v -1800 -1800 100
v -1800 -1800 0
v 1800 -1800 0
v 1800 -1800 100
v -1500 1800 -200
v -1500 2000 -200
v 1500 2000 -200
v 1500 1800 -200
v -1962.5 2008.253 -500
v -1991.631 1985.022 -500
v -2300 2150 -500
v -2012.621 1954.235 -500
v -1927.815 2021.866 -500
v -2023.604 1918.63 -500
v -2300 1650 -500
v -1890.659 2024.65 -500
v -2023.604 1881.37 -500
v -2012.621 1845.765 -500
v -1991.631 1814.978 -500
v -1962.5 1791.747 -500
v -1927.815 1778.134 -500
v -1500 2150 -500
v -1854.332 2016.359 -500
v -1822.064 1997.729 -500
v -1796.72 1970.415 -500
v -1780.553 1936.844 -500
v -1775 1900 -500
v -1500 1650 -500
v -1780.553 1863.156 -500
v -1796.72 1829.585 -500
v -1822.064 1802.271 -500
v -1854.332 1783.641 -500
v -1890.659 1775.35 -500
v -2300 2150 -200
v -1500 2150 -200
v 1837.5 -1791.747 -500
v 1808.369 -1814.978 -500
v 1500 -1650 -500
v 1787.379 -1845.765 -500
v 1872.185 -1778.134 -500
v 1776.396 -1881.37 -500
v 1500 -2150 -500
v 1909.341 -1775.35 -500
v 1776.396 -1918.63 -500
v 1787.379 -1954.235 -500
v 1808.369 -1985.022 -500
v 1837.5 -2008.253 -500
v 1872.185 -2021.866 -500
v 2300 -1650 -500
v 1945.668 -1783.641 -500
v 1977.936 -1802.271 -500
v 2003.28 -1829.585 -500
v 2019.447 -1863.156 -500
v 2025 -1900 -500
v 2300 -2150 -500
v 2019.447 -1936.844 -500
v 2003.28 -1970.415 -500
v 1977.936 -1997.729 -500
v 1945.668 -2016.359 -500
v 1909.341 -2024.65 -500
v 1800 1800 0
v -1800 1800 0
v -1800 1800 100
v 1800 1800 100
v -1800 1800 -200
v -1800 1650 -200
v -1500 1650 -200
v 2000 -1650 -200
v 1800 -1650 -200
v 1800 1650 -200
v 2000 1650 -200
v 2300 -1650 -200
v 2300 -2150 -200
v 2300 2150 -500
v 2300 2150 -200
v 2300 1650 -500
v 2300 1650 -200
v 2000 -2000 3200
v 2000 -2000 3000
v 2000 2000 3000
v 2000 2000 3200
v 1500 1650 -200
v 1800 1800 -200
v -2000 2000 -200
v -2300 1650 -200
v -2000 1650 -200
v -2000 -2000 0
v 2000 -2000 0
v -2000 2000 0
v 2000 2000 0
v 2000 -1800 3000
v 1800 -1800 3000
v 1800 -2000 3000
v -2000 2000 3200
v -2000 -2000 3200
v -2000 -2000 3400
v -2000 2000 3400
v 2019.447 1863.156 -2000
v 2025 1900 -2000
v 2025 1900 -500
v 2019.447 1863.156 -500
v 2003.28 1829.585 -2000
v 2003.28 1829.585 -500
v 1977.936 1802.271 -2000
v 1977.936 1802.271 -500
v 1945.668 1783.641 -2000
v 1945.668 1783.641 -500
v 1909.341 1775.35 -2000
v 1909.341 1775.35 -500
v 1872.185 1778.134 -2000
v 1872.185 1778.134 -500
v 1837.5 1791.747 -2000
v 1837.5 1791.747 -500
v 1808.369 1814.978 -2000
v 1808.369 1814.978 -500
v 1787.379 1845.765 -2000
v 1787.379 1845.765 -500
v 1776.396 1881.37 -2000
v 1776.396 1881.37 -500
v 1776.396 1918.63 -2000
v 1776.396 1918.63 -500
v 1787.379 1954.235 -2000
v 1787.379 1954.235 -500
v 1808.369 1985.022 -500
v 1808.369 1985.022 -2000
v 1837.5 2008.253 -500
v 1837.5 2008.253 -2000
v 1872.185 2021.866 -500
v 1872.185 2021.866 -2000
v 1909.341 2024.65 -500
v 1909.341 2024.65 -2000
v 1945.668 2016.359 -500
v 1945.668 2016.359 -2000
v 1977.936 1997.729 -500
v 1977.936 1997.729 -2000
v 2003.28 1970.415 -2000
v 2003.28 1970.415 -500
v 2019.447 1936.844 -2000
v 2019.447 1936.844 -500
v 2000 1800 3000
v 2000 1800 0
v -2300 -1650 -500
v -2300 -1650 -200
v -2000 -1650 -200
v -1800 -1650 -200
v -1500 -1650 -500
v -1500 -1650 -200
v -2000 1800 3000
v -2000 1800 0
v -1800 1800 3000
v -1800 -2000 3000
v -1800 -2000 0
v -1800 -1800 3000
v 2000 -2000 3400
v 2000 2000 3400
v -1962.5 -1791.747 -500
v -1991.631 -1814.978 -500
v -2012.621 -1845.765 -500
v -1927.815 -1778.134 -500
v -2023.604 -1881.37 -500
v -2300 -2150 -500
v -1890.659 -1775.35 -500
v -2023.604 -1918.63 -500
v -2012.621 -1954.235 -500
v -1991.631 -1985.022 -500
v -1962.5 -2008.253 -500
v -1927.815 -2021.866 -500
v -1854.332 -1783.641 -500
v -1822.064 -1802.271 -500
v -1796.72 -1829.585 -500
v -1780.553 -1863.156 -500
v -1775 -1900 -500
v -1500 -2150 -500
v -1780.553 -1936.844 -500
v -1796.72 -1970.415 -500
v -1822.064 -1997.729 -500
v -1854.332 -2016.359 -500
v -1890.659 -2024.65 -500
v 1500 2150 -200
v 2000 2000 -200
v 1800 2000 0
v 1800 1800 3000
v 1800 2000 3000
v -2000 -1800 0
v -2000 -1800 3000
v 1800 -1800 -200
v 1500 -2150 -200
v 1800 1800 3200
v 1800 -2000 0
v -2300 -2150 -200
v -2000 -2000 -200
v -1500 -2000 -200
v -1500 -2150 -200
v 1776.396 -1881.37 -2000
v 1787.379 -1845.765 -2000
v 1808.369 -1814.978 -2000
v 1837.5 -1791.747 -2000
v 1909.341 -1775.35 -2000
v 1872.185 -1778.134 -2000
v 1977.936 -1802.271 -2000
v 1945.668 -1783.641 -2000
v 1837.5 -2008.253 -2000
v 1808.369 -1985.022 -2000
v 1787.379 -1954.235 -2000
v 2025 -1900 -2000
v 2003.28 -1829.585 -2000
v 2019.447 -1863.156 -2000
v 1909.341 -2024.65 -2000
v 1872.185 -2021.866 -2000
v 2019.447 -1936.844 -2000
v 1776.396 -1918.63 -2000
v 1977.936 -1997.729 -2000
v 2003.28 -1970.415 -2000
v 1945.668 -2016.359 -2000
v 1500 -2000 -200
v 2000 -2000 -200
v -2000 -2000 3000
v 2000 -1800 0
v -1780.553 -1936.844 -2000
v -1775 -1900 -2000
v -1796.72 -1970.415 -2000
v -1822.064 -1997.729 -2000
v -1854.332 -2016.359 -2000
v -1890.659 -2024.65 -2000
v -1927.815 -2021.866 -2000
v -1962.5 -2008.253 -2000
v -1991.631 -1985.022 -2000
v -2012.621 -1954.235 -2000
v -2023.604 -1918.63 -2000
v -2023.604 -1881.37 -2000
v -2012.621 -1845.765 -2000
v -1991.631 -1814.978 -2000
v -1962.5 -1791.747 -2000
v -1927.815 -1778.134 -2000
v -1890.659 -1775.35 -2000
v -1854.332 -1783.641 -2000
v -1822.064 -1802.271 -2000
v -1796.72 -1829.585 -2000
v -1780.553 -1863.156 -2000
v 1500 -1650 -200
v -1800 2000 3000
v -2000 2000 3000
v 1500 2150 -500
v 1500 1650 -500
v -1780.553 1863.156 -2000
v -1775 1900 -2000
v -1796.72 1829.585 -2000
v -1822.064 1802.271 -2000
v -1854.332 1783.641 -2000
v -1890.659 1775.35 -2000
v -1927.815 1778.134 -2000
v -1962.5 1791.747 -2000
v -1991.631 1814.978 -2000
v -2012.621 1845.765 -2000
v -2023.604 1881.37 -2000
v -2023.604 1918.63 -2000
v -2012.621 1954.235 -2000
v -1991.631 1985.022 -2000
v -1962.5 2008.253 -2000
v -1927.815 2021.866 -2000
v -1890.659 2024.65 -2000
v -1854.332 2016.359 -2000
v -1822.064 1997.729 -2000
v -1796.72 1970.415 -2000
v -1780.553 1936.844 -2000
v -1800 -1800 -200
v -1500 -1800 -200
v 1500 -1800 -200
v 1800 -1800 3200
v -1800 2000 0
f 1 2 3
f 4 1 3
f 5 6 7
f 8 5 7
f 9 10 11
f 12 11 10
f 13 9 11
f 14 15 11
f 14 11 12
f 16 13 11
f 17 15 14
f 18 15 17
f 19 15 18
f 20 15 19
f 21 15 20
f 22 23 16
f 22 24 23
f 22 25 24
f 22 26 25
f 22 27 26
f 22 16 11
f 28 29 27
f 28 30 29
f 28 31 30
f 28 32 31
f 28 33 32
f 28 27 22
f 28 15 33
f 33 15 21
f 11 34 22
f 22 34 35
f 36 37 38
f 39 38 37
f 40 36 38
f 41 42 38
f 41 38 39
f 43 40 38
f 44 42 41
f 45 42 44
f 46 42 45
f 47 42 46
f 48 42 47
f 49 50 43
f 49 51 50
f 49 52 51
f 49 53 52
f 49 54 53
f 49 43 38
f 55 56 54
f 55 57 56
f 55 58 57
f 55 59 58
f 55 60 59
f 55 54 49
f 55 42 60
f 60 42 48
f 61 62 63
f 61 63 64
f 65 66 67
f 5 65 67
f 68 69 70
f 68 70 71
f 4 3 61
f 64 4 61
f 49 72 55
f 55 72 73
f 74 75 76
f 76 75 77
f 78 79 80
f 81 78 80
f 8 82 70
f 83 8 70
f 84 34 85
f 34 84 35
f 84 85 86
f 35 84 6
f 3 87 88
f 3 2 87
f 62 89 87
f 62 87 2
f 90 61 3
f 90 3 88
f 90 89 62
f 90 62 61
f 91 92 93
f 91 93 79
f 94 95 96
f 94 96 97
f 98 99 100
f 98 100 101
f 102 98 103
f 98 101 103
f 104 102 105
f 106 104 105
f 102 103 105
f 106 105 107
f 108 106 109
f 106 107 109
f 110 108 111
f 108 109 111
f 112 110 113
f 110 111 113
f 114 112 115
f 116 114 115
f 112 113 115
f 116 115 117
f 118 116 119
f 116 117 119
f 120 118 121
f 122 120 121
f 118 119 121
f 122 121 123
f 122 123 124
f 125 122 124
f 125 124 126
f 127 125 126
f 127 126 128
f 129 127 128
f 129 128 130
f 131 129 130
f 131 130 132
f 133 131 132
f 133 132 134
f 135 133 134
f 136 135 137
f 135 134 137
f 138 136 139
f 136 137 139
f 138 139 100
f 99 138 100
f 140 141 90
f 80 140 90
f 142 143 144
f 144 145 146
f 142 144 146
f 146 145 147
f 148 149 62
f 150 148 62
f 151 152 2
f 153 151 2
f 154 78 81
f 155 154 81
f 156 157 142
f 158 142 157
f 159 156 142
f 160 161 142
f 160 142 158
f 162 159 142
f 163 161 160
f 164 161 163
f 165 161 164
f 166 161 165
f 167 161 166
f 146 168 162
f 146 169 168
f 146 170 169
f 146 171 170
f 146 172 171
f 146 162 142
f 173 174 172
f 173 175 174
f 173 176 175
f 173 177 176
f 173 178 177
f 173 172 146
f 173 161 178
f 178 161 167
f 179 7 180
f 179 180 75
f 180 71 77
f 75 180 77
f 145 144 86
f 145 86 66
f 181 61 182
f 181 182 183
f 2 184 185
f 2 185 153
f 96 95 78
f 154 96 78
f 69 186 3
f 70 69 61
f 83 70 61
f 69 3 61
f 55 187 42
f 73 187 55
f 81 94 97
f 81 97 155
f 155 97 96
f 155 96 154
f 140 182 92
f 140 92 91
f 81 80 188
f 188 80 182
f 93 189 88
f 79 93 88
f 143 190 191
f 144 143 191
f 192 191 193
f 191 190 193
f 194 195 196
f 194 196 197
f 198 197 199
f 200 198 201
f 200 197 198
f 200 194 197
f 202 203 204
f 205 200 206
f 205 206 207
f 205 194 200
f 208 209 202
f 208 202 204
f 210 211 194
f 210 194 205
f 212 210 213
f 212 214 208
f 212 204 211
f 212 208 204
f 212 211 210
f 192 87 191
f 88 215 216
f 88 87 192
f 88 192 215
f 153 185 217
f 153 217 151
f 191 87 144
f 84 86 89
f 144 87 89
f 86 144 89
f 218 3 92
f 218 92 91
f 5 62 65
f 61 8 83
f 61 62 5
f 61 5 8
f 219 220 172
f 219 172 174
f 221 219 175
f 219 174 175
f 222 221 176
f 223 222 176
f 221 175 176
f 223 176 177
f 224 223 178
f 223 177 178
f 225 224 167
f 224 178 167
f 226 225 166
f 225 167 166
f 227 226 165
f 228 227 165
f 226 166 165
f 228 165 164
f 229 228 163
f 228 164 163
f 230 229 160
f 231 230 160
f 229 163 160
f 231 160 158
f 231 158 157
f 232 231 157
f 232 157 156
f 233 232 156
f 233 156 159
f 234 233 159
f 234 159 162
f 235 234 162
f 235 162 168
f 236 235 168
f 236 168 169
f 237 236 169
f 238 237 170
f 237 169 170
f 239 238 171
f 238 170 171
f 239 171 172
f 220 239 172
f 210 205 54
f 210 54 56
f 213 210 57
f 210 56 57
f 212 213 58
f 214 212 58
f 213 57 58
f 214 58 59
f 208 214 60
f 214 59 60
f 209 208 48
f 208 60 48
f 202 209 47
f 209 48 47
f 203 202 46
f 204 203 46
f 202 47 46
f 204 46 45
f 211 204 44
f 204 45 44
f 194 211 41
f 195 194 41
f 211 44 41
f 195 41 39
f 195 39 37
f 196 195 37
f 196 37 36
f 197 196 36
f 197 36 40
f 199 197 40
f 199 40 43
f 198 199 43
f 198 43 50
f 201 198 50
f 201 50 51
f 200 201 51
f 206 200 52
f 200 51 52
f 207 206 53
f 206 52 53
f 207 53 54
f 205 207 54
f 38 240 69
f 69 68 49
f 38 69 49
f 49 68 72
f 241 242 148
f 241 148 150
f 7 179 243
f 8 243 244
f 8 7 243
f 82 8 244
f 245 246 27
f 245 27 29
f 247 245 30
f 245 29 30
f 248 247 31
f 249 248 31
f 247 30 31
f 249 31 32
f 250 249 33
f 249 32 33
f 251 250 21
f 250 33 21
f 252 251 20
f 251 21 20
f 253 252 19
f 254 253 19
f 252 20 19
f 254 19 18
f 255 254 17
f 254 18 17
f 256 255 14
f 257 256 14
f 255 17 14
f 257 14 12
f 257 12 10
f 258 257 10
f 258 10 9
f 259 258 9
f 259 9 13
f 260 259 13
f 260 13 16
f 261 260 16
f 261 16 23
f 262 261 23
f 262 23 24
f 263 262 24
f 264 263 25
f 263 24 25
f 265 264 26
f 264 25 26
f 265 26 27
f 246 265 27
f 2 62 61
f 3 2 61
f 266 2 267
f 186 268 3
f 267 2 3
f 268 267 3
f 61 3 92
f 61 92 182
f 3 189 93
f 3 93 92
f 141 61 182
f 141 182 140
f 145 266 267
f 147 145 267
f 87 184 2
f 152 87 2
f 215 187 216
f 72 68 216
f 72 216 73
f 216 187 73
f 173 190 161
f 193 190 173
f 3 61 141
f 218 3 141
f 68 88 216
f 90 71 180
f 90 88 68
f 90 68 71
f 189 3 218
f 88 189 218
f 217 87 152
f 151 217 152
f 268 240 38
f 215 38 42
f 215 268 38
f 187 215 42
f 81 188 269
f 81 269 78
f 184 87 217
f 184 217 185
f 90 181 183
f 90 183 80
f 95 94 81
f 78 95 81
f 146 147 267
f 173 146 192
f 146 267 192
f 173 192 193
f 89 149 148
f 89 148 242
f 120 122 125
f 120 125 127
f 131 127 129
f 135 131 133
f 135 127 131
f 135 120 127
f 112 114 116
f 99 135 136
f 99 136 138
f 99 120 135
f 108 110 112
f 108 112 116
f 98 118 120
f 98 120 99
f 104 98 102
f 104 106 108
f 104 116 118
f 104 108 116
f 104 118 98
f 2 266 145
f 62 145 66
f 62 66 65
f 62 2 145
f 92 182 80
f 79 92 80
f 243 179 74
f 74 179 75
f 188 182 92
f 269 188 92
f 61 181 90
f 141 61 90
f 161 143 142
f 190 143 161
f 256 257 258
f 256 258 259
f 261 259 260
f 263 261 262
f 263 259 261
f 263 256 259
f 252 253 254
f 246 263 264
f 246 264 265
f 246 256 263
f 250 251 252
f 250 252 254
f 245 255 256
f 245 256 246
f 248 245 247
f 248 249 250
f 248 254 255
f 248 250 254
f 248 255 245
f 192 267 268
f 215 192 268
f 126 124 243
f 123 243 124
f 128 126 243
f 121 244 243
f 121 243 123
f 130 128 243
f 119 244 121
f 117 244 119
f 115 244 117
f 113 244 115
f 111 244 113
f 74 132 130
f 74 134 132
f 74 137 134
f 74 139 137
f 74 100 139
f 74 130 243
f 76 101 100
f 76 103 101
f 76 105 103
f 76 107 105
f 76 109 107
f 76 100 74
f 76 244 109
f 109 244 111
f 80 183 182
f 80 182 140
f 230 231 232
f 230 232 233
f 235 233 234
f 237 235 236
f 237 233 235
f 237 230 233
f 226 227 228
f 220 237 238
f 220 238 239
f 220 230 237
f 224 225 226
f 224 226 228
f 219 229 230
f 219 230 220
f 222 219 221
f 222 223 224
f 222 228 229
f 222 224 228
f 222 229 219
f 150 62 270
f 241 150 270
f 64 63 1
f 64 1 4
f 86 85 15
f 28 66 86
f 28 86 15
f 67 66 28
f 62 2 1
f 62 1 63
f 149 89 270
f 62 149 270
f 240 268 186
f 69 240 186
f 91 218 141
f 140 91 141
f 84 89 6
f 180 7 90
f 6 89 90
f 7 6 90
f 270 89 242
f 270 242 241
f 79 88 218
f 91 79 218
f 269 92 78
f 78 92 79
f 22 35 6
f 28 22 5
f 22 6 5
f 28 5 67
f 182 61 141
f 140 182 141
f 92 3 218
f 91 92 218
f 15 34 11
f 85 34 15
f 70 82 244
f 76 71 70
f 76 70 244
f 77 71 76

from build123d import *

# Parameters (mm, degrees)
F0_W      = 200
F0_H      = 200
F1_DEPTH  = 3000
F7_W      = 4000
F7_H      = 4000
F7_W_2    = 3600
F7_H_2    = 3600
F8_DEPTH  = 200
F2_W      = 800
F2_H      = 500
F9_DEPTH  = 300
F3_R      = 125
F10_DEPTH = 1500
F11_W     = 3600
F11_H     = 3600
F12_DEPTH = 100
F5_DEPTH  = 200
F13_W     = 200
F13_H     = 3600
F6_DEPTH  = 3000
F14_W     = 4000
F14_H     = 4000
F15_DEPTH = 200


with BuildPart() as f1:
    # F0 (on Top) → F1 (new body)
    with BuildSketch(Plane.XY):
        with Locations((-1900, -1900)):
            Rectangle(F0_W, F0_H)
        with Locations((1900, 1900)):
            Rectangle(F0_W, F0_H)
        with Locations((-1900, 1900)):
            Rectangle(F0_W, F0_H)
        with Locations((1900, -1900)):
            Rectangle(F0_W, F0_H)
    extrude(amount=F1_DEPTH)


with BuildPart() as f8:
    # F7 (on Top) → F8 (new body)
    with BuildSketch(Plane.XY):
        Rectangle(F7_W, F7_H)
        Rectangle(F7_W_2, F7_H_2, mode=Mode.SUBTRACT)
    extrude(amount=-F8_DEPTH)

    # F2 (on face) → F9 (join)
    with BuildSketch(Plane(origin=(0, 0, -200), x_dir=(1, 0, 0), z_dir=(0, 0, -1))):
        with Locations((-1900, -1900)):
            Rectangle(F2_W, F2_H)
        with Locations((-1900, 1900)):
            Rectangle(F2_W, F2_H)
        with Locations((1900, -1900)):
            Rectangle(F2_W, F2_H)
        with Locations((1900, 1900)):
            Rectangle(F2_W, F2_H)
    extrude(amount=F9_DEPTH)

    # F3 (on face) → F10 (join)
    with BuildSketch(Plane(origin=(0, 0, -500), x_dir=(1, 0, 0), z_dir=(0, 0, -1))):
        with Locations((1900, 1900)):
            Circle(F3_R)
        with Locations((-1900, 1900)):
            Circle(F3_R)
        with Locations((-1900, -1900)):
            Circle(F3_R)
        with Locations((1900, -1900)):
            Circle(F3_R)
    extrude(amount=F10_DEPTH)


with BuildPart() as f12:
    # F11 (on Top) → F12 (new body)
    with BuildSketch(Plane.XY):
        Rectangle(F11_W, F11_H)
    extrude(amount=F12_DEPTH)


with BuildPart() as f5:
    # F4 (on face) → F5 (new body)
    with BuildSketch(Plane.XY.offset(3000)):
        Polygon((1800, 1800), (1800, -1800), (2000, -2000), (2000, 2000), align=None)
    extrude(amount=F5_DEPTH)


with BuildPart() as f6:
    # F13 (on face) → F6 (new body)
    with BuildSketch(Plane.XY):
        with Locations((1900, 0)):
            Rectangle(F13_W, F13_H)
    extrude(amount=F6_DEPTH)


with BuildPart() as f15:
    # F14 (on face) → F15 (new body)
    with BuildSketch(Plane.XY.offset(3200)):
        Rectangle(F14_W, F14_H)
    extrude(amount=F15_DEPTH)


solid = Compound([f1.part, f8.part, f12.part, f5.part, f6.part, f15.part])
